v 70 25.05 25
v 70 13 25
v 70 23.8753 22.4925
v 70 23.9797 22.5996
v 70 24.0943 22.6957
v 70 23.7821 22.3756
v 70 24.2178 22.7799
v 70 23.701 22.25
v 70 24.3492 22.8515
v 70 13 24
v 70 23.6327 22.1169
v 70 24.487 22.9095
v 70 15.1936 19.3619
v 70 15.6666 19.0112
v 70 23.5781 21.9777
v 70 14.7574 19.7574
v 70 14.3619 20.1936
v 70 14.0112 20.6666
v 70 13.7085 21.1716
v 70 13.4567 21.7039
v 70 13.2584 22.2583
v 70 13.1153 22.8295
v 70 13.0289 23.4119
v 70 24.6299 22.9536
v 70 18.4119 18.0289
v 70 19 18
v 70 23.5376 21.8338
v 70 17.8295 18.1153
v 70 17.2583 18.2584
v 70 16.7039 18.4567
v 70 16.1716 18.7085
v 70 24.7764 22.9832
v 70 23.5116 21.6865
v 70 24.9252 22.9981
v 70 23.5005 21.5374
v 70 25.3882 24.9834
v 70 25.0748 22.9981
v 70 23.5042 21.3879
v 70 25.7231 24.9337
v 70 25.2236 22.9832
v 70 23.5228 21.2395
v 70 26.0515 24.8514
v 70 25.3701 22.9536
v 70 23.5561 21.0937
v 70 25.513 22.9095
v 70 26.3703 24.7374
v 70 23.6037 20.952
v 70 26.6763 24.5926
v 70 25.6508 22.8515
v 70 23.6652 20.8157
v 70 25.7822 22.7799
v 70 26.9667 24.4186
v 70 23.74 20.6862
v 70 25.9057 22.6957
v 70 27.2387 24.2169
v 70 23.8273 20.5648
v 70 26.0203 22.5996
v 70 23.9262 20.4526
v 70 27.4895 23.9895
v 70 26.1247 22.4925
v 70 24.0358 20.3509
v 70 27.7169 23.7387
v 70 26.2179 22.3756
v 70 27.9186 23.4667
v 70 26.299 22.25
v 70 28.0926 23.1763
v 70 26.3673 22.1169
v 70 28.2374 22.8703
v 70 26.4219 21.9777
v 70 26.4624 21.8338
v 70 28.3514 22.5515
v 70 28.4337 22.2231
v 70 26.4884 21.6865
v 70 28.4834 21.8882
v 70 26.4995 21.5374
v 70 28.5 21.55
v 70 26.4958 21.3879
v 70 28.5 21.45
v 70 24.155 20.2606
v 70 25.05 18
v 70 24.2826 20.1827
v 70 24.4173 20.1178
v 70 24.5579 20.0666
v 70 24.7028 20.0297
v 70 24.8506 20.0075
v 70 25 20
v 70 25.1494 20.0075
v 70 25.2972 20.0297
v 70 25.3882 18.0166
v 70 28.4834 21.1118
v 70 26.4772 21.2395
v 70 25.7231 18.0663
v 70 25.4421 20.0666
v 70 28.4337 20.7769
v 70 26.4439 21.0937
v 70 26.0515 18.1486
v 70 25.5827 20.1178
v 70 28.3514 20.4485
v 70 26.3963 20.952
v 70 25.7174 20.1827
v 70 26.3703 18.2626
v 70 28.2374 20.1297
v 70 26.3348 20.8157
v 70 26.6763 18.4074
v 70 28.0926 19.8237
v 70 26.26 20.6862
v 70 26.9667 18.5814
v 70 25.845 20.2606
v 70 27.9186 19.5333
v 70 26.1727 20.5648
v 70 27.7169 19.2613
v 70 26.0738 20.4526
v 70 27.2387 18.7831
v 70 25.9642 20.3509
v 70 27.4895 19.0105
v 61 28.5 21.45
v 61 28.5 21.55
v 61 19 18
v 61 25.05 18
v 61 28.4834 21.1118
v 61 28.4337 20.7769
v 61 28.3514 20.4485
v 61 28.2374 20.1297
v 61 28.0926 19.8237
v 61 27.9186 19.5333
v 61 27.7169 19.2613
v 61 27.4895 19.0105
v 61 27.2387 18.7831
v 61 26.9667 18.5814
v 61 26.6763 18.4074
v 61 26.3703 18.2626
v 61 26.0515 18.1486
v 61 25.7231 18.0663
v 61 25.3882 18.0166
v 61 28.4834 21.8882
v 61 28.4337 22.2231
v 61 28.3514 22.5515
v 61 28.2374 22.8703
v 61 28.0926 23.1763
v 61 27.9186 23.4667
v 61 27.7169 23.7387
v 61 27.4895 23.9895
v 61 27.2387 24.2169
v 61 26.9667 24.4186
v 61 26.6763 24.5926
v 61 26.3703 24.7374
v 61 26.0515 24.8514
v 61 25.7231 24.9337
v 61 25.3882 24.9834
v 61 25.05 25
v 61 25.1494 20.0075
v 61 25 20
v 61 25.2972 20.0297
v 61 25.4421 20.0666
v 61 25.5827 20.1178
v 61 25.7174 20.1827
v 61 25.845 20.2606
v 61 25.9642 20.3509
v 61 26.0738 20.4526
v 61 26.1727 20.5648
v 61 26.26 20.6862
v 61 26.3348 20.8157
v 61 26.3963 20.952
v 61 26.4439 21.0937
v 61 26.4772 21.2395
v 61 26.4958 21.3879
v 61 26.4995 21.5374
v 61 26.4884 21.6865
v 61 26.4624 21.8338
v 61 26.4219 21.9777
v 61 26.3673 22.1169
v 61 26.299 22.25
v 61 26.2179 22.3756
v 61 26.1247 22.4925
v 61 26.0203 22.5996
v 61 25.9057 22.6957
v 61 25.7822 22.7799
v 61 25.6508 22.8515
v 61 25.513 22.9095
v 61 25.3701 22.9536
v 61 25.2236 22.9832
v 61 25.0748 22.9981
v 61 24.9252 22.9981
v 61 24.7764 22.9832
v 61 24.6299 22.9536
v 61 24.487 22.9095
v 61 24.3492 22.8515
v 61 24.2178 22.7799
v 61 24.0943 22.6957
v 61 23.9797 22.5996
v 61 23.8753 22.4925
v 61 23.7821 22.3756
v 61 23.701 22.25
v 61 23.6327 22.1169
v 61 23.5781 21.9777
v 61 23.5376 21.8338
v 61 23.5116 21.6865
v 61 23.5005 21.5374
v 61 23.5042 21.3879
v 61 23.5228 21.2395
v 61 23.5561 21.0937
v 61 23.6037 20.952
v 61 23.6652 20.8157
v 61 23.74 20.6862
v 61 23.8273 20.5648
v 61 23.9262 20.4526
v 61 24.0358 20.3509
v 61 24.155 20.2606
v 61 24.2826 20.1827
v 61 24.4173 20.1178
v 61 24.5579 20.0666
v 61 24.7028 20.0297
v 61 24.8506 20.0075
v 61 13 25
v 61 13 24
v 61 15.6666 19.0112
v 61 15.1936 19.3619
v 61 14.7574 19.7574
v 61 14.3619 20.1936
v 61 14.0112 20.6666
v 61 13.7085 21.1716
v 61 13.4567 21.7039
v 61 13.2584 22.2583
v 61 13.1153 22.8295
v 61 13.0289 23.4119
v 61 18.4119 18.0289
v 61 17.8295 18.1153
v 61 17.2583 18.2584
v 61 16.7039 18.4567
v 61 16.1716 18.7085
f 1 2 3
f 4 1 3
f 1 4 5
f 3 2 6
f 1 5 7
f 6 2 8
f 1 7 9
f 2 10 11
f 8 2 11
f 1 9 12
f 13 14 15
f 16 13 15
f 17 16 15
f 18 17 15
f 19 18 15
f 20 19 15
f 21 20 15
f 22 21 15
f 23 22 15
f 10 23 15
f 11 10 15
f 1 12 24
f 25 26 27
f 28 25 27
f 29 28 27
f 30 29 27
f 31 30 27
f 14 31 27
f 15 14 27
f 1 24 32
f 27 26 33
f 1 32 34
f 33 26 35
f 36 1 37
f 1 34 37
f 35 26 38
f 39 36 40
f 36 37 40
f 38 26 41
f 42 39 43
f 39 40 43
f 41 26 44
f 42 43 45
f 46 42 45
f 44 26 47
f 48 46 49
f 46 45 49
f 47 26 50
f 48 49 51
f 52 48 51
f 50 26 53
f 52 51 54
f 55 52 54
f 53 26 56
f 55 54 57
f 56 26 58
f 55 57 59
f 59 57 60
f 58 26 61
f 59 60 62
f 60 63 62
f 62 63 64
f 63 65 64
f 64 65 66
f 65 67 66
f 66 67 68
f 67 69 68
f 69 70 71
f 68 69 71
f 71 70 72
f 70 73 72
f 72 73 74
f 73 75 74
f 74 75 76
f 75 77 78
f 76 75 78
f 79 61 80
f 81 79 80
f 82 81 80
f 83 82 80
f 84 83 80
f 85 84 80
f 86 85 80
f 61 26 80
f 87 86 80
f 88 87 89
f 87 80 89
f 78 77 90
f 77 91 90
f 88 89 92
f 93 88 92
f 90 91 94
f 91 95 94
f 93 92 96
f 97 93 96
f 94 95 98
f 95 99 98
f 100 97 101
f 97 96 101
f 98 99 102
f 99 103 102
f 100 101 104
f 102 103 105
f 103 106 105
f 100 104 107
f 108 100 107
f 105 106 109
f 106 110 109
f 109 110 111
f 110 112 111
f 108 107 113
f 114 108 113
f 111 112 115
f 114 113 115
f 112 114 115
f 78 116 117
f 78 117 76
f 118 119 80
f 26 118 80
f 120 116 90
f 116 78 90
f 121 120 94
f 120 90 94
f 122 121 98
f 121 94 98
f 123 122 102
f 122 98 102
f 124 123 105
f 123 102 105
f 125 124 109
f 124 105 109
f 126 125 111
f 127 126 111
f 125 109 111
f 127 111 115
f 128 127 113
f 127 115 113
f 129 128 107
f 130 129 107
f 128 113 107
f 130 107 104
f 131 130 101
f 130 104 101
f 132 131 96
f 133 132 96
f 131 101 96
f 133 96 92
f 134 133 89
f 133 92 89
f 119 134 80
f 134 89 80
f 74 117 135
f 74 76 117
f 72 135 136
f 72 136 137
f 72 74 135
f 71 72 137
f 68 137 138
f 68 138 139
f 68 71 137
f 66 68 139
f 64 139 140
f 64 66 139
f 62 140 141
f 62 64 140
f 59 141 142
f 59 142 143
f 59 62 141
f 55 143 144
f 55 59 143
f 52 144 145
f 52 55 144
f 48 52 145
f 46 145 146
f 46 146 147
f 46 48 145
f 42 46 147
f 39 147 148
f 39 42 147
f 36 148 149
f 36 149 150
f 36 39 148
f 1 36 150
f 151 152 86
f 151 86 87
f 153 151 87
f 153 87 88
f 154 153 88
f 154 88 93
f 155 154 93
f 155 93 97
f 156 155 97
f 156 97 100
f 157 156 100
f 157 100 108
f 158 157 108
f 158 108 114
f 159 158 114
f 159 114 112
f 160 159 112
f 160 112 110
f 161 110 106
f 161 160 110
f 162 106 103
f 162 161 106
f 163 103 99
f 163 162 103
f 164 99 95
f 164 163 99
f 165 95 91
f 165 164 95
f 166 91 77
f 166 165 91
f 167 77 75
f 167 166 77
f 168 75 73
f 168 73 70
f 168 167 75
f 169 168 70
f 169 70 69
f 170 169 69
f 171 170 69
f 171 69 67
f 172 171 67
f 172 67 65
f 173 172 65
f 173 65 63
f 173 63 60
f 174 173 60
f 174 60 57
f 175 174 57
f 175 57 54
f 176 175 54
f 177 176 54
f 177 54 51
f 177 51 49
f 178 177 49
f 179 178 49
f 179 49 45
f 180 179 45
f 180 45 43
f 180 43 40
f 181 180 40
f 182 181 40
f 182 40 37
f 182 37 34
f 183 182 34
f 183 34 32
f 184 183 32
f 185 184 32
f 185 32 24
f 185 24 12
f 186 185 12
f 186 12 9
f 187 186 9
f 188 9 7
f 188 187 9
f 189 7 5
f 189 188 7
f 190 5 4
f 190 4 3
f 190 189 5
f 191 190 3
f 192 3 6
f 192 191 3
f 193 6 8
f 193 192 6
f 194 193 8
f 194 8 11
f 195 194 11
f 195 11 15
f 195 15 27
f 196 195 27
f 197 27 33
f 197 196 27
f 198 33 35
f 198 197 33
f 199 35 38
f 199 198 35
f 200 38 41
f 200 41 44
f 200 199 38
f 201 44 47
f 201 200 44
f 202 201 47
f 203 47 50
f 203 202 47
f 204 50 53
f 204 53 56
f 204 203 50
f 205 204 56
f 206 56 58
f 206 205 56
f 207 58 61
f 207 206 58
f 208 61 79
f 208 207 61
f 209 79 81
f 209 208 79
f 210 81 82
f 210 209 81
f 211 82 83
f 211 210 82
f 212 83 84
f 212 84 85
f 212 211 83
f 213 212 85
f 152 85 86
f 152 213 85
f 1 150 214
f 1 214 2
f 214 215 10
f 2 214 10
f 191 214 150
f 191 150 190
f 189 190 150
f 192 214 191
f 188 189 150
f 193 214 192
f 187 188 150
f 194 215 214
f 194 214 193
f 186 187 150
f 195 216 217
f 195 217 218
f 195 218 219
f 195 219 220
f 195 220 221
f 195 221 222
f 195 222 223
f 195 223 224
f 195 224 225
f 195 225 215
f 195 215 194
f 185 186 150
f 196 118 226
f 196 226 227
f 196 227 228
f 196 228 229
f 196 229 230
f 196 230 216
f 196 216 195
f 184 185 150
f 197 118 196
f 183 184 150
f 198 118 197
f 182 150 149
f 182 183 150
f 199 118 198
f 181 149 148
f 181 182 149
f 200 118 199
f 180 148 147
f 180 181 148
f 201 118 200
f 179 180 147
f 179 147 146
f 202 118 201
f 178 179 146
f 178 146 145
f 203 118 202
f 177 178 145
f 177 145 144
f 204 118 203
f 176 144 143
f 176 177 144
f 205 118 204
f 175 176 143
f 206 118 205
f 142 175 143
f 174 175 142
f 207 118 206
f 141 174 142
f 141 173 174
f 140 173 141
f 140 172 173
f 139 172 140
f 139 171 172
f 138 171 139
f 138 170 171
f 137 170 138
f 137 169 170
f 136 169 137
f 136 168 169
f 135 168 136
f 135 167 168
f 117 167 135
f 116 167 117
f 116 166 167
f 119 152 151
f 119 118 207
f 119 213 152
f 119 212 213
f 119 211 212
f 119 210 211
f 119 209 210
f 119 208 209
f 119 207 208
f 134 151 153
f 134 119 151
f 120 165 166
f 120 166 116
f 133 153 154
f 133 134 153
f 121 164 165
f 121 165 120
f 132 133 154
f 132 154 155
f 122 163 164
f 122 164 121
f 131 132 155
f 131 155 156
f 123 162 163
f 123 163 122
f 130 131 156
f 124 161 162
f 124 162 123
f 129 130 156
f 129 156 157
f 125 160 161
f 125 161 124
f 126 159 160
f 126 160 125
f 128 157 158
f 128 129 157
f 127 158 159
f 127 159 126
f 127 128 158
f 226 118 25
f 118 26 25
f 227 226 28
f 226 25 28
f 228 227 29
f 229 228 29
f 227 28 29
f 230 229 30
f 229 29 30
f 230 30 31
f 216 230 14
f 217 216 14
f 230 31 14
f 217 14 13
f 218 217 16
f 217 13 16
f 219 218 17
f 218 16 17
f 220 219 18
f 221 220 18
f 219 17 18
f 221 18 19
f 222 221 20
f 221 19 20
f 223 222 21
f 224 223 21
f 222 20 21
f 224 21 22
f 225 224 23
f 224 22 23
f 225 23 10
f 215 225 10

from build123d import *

# Parameters (mm, degrees)
CYLINDER002_R        = 1.5
CYLINDER002_DEPTH    = 11
BOX010_W             = 9
BOX010_H             = 15.5
BOX010_DEPTH         = 7
FILLET002008005010_R = 3.45
FILLET002008005011_R = 6


with BuildPart() as cylinder002:
    # Cylinder002 → Cylinder002 (new body)
    with BuildSketch(Plane(origin=(59, 25, 21.5), x_dir=(0, 0, -1), z_dir=(1, 0, 0))):
        Circle(CYLINDER002_R)
    extrude(amount=CYLINDER002_DEPTH)


with BuildPart() as cut:
    # Box010 → Box010 (new body)
    with BuildSketch(Plane(origin=(61, 13, 18), x_dir=(1, 0, 0), z_dir=(0, 0, 1))):
        with Locations((4.5, 7.75)):
            Rectangle(BOX010_W, BOX010_H)
    extrude(amount=BOX010_DEPTH)

    # Fillet002008005010
    fillet002008005010_edges = [cut.edges().sort_by_distance(p)[0] for p in [
        (65.5, 28.5, 18),
        (65.5, 28.5, 25),
    ]]
    fillet(fillet002008005010_edges, radius=FILLET002008005010_R)

    # Fillet002008005011
    fillet002008005011_edges = [cut.edges().sort_by_distance(p)[0] for p in [
        (65.5, 13, 18),
    ]]
    fillet(fillet002008005011_edges, radius=FILLET002008005011_R)

    # Cut: cut Cylinder002
    add(cylinder002.part, mode=Mode.SUBTRACT)


solid = cut.part
